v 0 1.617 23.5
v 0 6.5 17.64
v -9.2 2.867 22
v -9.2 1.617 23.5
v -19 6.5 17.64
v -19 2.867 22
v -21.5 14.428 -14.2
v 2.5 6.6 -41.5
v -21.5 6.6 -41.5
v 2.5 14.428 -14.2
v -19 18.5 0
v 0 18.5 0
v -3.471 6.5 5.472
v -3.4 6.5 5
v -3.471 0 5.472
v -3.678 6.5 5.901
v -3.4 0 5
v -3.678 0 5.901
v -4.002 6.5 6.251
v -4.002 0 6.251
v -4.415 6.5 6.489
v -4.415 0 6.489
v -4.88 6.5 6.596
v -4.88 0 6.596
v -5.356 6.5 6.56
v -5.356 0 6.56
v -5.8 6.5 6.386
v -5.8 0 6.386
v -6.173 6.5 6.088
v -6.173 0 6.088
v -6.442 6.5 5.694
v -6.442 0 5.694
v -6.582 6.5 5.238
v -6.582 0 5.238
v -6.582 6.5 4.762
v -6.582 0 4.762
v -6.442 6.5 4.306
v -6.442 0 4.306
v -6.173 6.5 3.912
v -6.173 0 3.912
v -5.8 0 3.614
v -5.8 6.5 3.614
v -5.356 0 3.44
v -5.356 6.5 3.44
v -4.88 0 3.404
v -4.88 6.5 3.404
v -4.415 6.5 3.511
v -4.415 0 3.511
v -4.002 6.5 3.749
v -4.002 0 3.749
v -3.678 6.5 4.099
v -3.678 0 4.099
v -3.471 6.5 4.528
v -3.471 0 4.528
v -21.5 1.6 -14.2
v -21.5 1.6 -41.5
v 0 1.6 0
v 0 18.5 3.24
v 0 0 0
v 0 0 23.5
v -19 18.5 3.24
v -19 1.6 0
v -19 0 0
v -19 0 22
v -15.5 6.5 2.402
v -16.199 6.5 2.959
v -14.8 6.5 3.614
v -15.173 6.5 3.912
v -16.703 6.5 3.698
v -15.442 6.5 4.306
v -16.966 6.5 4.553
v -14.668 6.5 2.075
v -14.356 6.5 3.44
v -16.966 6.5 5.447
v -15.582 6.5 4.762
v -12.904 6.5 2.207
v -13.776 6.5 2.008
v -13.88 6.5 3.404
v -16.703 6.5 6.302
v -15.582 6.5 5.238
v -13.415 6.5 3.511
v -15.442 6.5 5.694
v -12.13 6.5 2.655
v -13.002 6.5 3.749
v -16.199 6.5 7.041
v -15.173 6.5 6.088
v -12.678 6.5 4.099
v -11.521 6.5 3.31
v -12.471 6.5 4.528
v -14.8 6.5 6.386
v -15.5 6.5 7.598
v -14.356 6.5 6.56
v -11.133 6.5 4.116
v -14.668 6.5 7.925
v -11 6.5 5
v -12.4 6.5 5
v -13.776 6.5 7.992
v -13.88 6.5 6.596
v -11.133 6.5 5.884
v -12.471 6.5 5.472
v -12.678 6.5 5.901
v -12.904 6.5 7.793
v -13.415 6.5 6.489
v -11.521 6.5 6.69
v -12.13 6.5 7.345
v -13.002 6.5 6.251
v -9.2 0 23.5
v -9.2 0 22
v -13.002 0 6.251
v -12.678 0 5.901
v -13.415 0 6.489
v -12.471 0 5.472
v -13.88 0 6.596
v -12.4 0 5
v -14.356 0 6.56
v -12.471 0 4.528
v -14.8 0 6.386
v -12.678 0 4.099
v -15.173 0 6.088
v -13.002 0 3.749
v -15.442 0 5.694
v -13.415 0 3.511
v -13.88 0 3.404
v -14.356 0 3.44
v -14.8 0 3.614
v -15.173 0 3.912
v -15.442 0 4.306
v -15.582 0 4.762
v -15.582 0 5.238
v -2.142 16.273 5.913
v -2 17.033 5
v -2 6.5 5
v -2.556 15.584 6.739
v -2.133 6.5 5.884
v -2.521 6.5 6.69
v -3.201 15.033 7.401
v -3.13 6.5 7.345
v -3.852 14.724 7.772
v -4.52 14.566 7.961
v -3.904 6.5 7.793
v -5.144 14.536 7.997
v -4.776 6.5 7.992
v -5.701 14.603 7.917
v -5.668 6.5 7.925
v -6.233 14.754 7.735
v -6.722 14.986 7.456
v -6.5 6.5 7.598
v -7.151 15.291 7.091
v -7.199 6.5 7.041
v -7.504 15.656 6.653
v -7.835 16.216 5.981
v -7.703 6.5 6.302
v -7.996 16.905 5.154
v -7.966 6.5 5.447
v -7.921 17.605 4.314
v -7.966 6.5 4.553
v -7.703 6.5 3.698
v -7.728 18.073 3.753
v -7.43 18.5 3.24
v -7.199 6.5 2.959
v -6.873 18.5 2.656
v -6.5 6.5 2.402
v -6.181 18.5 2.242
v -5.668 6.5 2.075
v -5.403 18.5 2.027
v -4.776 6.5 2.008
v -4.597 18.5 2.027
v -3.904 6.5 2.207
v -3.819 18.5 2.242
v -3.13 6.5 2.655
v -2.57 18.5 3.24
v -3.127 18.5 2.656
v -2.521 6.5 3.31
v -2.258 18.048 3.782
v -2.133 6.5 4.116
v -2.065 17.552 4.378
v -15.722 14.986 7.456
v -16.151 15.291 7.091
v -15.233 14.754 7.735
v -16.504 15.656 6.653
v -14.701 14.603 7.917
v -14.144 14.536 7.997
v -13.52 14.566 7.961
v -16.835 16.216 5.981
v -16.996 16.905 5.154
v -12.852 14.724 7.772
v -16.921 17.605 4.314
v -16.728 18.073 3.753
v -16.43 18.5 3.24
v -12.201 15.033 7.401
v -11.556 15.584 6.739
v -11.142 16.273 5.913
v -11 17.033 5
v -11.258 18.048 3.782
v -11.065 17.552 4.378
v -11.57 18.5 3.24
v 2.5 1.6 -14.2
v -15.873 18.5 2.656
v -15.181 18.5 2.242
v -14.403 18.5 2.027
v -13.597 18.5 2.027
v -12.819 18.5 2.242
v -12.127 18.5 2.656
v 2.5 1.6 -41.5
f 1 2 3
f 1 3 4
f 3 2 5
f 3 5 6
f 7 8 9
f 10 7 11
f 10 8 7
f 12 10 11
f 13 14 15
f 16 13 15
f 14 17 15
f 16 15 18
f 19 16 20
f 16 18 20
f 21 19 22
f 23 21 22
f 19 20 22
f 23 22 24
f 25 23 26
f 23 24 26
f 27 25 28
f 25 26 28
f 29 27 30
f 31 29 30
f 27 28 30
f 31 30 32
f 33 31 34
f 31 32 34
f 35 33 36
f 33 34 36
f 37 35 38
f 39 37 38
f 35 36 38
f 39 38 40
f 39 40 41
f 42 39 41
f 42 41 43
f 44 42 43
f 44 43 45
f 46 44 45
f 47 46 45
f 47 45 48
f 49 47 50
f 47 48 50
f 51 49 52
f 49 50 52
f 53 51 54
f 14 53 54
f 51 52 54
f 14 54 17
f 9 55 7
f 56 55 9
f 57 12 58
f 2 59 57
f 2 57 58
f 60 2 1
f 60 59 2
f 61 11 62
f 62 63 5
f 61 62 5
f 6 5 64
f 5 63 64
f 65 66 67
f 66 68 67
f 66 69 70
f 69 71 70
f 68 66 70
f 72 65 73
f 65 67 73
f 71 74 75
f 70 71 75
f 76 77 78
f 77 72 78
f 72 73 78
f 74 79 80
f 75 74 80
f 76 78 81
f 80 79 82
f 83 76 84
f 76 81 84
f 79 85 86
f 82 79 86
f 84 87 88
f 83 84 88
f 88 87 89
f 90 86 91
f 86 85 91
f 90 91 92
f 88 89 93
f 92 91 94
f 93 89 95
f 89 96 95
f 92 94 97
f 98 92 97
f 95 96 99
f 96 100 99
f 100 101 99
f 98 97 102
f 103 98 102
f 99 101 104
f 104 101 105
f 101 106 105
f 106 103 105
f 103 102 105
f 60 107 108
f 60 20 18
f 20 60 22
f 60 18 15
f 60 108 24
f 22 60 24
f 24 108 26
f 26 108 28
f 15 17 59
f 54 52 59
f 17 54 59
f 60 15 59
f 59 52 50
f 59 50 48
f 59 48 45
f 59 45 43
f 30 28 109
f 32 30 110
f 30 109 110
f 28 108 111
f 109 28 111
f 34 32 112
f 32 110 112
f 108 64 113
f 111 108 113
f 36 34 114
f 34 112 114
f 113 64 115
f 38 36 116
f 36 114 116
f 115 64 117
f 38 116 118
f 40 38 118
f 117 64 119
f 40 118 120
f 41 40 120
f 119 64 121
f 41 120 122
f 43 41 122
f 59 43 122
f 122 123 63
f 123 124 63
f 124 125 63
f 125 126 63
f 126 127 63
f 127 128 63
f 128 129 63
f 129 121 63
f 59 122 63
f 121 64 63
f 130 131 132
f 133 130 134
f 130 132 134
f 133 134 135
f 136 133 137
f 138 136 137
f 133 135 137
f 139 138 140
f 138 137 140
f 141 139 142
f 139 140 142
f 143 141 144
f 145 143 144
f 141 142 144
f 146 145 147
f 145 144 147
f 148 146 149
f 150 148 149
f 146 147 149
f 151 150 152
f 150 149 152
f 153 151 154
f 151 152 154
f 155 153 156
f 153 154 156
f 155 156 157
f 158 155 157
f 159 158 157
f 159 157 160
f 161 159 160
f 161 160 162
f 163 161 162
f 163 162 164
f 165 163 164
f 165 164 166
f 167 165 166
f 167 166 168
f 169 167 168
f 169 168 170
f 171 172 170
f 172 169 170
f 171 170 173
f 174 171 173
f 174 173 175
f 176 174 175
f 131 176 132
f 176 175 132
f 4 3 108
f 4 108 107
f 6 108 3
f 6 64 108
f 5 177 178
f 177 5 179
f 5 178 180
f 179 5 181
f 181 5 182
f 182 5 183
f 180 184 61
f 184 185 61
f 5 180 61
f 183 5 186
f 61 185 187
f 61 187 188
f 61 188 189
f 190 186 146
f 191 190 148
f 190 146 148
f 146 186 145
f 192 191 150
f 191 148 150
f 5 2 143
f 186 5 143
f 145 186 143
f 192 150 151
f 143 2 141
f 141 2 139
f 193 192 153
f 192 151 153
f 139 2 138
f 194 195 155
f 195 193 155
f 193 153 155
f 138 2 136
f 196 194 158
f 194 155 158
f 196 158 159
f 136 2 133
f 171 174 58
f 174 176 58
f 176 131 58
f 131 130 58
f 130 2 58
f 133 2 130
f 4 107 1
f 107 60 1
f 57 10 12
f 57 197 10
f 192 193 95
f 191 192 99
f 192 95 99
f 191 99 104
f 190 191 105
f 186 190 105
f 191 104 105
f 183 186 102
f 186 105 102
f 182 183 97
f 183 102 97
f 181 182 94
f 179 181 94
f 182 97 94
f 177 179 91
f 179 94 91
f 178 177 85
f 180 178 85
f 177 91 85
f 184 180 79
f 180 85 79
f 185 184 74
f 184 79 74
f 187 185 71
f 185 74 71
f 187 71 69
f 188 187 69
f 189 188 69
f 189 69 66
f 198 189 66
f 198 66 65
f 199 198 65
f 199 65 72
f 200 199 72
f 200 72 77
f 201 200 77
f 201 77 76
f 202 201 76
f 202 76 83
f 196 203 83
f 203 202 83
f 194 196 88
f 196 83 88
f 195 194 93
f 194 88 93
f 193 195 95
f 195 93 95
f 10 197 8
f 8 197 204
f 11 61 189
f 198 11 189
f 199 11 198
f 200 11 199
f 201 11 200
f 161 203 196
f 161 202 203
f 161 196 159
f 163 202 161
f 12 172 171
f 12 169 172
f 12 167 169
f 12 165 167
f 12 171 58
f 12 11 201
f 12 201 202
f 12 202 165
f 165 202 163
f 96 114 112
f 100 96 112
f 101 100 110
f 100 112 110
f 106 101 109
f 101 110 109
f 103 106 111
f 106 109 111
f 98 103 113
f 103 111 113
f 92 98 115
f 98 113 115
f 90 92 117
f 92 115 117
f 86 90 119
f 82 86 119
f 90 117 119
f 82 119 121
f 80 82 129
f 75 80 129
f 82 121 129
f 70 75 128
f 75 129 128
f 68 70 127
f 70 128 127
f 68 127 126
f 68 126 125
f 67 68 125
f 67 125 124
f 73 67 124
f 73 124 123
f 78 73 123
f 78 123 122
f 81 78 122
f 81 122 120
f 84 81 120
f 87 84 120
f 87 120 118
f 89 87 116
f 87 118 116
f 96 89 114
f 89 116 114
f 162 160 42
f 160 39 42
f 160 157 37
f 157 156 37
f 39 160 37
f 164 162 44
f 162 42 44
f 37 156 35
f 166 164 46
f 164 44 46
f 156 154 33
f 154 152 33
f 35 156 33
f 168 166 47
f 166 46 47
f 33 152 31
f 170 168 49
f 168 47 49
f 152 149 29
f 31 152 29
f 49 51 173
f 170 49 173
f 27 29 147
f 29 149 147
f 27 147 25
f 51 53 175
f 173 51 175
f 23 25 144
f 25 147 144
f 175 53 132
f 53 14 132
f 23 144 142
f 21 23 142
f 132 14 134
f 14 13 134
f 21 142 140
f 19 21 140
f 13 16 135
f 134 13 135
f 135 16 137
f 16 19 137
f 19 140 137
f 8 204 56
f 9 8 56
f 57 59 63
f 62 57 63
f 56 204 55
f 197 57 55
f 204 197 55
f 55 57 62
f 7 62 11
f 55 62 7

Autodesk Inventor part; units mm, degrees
sketch "Sketch2" plane through (0, 0, 0) normal (0, 1, 0) x (-1, 0, 0)
  line L0 (0, 0) -> (19, 0)
  line L1 (19, 0) -> (19, 22)
  line L2 (19, 22) -> (0, 22)
  line L3 (0, 22) -> (0, 0)
  line L4 (19, 22) -> (14, 22)
  line L5 (14, 22) -> (14, 5)
  line L6 (14, 5) -> (19, 5)
  line L7 (19, 5) -> (19, 22)
  line L8 (0, 22) -> (5, 22)
  line L9 (5, 22) -> (5, 5)
  line L10 (5, 5) -> (0, 5)
  line L11 (0, 5) -> (0, 22)
  circle A0 centre (14, 5) radius 1.7
  circle A1 centre (5, 5) radius 1.7
  dimension "d0" = 19
  dimension "d1" = 22
  dimension "d2" = 5
  dimension "d3" = 17
  dimension "d4" = 5
  dimension "d5" = 17
  dimension "d6" = 3.4
  dimension "d7" = 3.4
extrude "Extrusion1" add sketch "Sketch2" along normal blind 17.2 contours L3 L10 A1 L9 L2 L5 A0 L6 L1 L0 | L3 L2 L9 A1 L10 | L6 A0 L5 L2 L1
sketch "Sketch4" plane through (0, 0, 22) normal (1, 0, 0) x (0, 0, -1)
  line L0 (0, 0) -> (17.2, 0)
  line L1 (17.2, 0) -> (-6, 0)
  line L2 (-6, 0) -> (-6, -60)
  line L3 (-6, -60) -> (17.2, -60)
  line L4 (17.2, -60) -> (17.2, 0)
  line L5 (0, 0) -> (17.2, 0)
  line L6 (17.2, 0) -> (-6, 0)
  line L7 (-6, 0) -> (-6, -60)
  line L8 (-6, -60) -> (17.2, -60)
  line L9 (17.2, -60) -> (17.2, 0)
  line L10 (0, 0) -> (22, 0) projected
  line L11 (22, 0) -> (22, -6)
  line L12 (22, -6) -> (82, -6)
  line L13 (82, -6) -> (82, 17.2)
  line L14 (82, 17.2) -> (22, 17.2)
  line L15 (22, 17.2) -> (22, -6)
  point P0 (0, 22)
  point P1 (0, 22)
  dimension "d15" = 23.2
  dimension "d16" = 60
  dimension "d17" = 23.2
  dimension "d18" = 60
  dimension "d19" = 6
  dimension "d20" = 60
  dimension "d21" = 23.2
extrude "Extrusion2" add sketch "Sketch4" against normal blind 19 contours L15 L14 L13 L12 L11
sketch "Sketch5" plane through (0, -6, -60) normal (0, -1, 0) x (1, 0, 0)
  line L0 (0, 82) -> (0, 0) projected
  line L1 (-19, 82) -> (-19, 0) projected
  line L2 (0, 0) -> (-19, 0)
  line L3 (-19, 0) -> (-19, 38.5)
  line L4 (-19, 38.5) -> (0, 38.5)
  line L5 (0, 38.5) -> (0, 0)
  point P0 (0, 60)
  dimension "d24" = 38.5
extrude "Extrusion3" cut sketch "Sketch5" against normal blind 18.2
sketch "Sketch6" plane through (0, 17.2, 0) normal (0, 1, 0) x (1, 0, 0)
  line L0 (0, -22) -> (0, 0) projected
  line L1 (-19, 21.5) -> (-19, 0) projected
  line L2 (0, -22) -> (-19, -22)
  line L3 (-19, -22) -> (-19, 0)
  line L4 (-19, 0) -> (0, 0)
  line L5 (0, 0) -> (0, -22)
  dimension "d27" = 22
extrude "Extrusion4" cut sketch "Sketch6" against normal blind 10
sketch "Sketch7" plane through (0, 17.2, 0) normal (0, 1, 0) x (1, 0, 0)
  line L0 (0, -22) -> (0, 0) projected
  line L1 (0, 0) -> (-19, 0) projected
  line L2 (0, 0) -> (-19, 0)
  line L3 (-9.5, 0) -> (6.4, 0)
  line L4 (6.4, 0) -> (6.4, 21.5)
  line L5 (0, 0) -> (0, 21.5) projected
  line L6 (6.4, 21.5) -> (0, 21.5)
  line L7 (0, 21.5) -> (0, 0)
  line L8 (0, 0) -> (6.4, 0)
  line L9 (6.4, 0) -> (6.4, 21.5)
  line L10 (-19, 21.5) -> (-19, 0) projected
  line L11 (-9.5, 0) -> (-19, 0)
  line L12 (-19, 0) -> (-19, 21.5)
  line L13 (-19, 21.5) -> (-9.5, 21.5)
  line L14 (-9.5, 21.5) -> (-9.5, 0)
  line L15 (-9.5, 0) -> (-25.4, 0)
  line L16 (-25.4, 0) -> (-25.4, 21.5)
  line L17 (-25.4, 21.5) -> (-9.5, 21.5)
  line L18 (-9.5, 21.5) -> (-9.5, 0)
  line L19 (6.4, 21.5) -> (0, 0)
  line L20 (-25.4, 21.5) -> (-19, 0)
  dimension "d30" = 15.9
  dimension "d31" = 21.5
  dimension "d32" = 15.9
extrude "Extrusion5" add sketch "Sketch7" against normal blind 23.2 contours L5 L6 L19 | L20 L17 L10
sketch "Sketch8" plane through (0, 17.2, 0) normal (0, 1, 0) x (1, 0, 0)
  line L0 (6.4, 21.5) -> (0, 0) projected
  line L1 (0, 21.5) -> (0, 60) projected
  line L2 (6.4, 21.5) -> (0, 21.5)
  line L3 (0, 21.5) -> (0, 60)
  line L4 (0, 60) -> (6.4, 60)
  line L5 (6.4, 60) -> (6.4, 21.5)
  line L6 (-19, 60) -> (-19, 21.5) projected
  line L7 (-19, 0) -> (-25.4, 21.5) projected
  line L8 (-19, 60) -> (-25.4, 60)
  line L9 (-25.4, 60) -> (-25.4, 21.5)
  line L10 (-25.4, 21.5) -> (-19, 21.5)
  line L11 (-19, 21.5) -> (-19, 60)
extrude "Extrusion6" add sketch "Sketch8" against normal blind 5
chamfer "Chamfer1" [suppressed]
ref_plane "Work Plane1" through (-25.4, 8, -21.5) normal (0, -1, 0) x (1, 0, 0)
chamfer "Chamfer4" distance 12 angle 25 1 edges at (-9.5, 7.2, 22) measured on face at (-10.7991, 7.2, 16.8632)
sketch "Sketch10" plane through (0, 12.2, -60) normal (0, -1, 0) x (1, 0, 0)
  line L0 (-25.4, 38.5) -> (6.4, 38.5)
  line L1 (-25.4, 38.5) -> (6.4, 38.5)
  line L2 (-9.5, 38.5) -> (-9.5, 26)
  line L3 (-9.5, 26) -> (-9.5, 6)
  line L4 (-9.5, 16) -> (-19.5, 16)
  line L5 (-19.5, 16) -> (0.5, 16)
  circle A0 centre (-19.5, 16) radius 1.7
  circle A1 centre (-9.5, 6) radius 1.7
  circle A2 centre (-9.5, 26) radius 1.7
  circle A3 centre (0.5, 16) radius 1.7
  point P0 (0, 60)
  point P1 (0, 60)
  dimension "d70" = 12.5
  dimension "d71" = 20
  dimension "d72" = 10
  dimension "d73" = 20
  dimension "d74" = 3.4
  dimension "d75" = 3.4
  dimension "d76" = 3.4
  dimension "d77" = 3.4
extrude "Extrusion9" cut sketch "Sketch10" against normal blind 10
sketch "Sketch11" plane through (0, 17.2, 0) normal (0, 1, 0) x (1, 0, 0)
  circle A0 centre (0.5, 44) radius 1.7 projected
  circle A1 centre (0.5, 44) radius 3.25
  circle A2 centre (-9.5, 54) radius 1.7 projected
  circle A3 centre (-9.5, 54) radius 3.25
  circle A4 centre (-19.5, 44) radius 1.7 projected
  circle A5 centre (-19.5, 44) radius 3.25
  circle A6 centre (-9.5, 34) radius 1.7 projected
  circle A7 centre (-9.5, 34) radius 3.25
  point P0 (0, 60)
  dimension "d84" = 6.5
  dimension "d85" = 6.5
  dimension "d86" = 6.5
  dimension "d87" = 6.5
extrude "Extrusion10" cut sketch "Sketch11" against normal blind 3 contours A1 | A2 | A3 | A4 | A5 | A6 | A7
ref_plane "Work Plane2" through (-9.5, 17.2, -60) normal (-1, 0, 0) x (0, 0, 1)
chamfer "Chamfer6" [suppressed]
sketch "l" plane through (-19, 0, 0) normal (-1, 0, 0) x (0, 0, 1)
  line L0 (22, 1.6043) -> (10, 7.2) projected
  line L1 (10, 7.2) -> (32.2401, -3.1707)
  line L2 (0, 0) -> (22, 0) projected
  line L3 (0, 0) -> (30.1828, 0)
  line L4 (22, 0) -> (23.5, 0)
  line L5 (23.5, 0) -> (23.5, 4.1635)
  line L6 (22, 0) -> (22, 1.6043) projected
  line L7 (22, 1.6043) -> (22, 0)
  point P0 (23.5, 0.9048)
  dimension "d104" = 1.5
extrude "Extrusion12" add sketch "l" against normal blind 9.2 contours L1 L5 L3 L6
sketch "Sketch14" plane through (-19, 0, 0) normal (-1, 0, 0) x (0, 0, 1)
  line L0 (0, 17.2) -> (25.44, 17.2)
  line L1 (25.44, 17.2) -> (25.44, 0)
  line L2 (25.44, 0) -> (0, 0)
  line L3 (0, 0) -> (0, 17.2)
  line L4 (0, 17.2) -> (25.44, 0)
  dimension "d107" = 25.44
extrude "Extrusion13" add sketch "Sketch14" against normal blind 19 contours L4 L2 L3
sketch "Sketch15" plane through (0, 0, 0) normal (0, -1, 0) x (1, 0, 0)
  line L0 (6.4, -21.5) -> (0, 0) projected
  line L1 (0, 0) -> (0, 5)
  line L2 (0, 25.44) -> (0, 0) projected
  line L3 (0, 5) -> (0, 10)
  line L4 (0, 5) -> (-5, 5)
  line L5 (0, 0) -> (-19, 0) projected
  line L6 (-19, 0) -> (-19, 5)
  line L7 (-19, 0) -> (-19, 25.44) projected
  line L8 (-19, 5) -> (-14, 5)
  circle A0 centre (-14, 5) radius 1.6
  circle A1 centre (-5, 5) radius 1.6
  point P0 (0.5177, -1.7393)
  point P1 (0.9, -3.0234)
  dimension "d110" = 5
  dimension "d111" = 5
  dimension "d112" = 5
  dimension "d113" = 5
  dimension "d114" = 5
  dimension "d115" = 3.2
  dimension "d116" = 3.2
extrude "Extrusion14" cut sketch "Sketch15" against normal blind 19
ref_plane "Work Plane3" through (0, 6.5, 0) normal (0, -1, 0) x (1, 0, 0)
sketch "Sketch16" plane through (0, 6.5, 0) normal (0, -1, 0) x (1, 0, 0)
  circle A0 centre (-14, 5) radius 1.6 projected
  circle A1 centre (-14, 5) radius 3
  circle A2 centre (-5, 5) radius 1.6 projected
  circle A3 centre (-5, 5) radius 3
  point P0 (0, 0)
  dimension "d120" = 6
  dimension "d121" = 6
extrude "Extrusion15" cut sketch "Sketch16" against normal blind 19
sketch "Sketch17" plane through (0, 17.2, 0) normal (0, 1, 0) x (1, 0, 0)
  line L0 (6.4, 60) -> (-25.4, 60) projected
  line L1 (0, 0) -> (6.4, 21.5) projected
  line L2 (6.4, 60) -> (6.4, 21.5)
  line L3 (0, 0) -> (-19, 0) projected
  line L4 (6.4, 21.5) -> (0, 0)
  line L5 (0, 0) -> (-19, 0)
  line L6 (-19, 0) -> (-25.4, 21.5)
  line L7 (-25.4, 21.5) -> (-25.4, 60)
  line L8 (-25.4, 60) -> (6.4, 60)
  circle A0 centre (-9.5, 54) radius 3.25 projected
  circle A1 centre (-9.5, 54) radius 3.25
  circle A2 centre (0.5, 44) radius 1.7 projected
  circle A3 centre (0.5, 44) radius 3.25
  circle A4 centre (-9.5, 34) radius 1.7 projected
  circle A5 centre (-9.5, 34) radius 3.25
  circle A6 centre (-19.5, 44) radius 1.7 projected
  circle A7 centre (-19.5, 44) radius 3.25
extrude "Extrusion16" add sketch "Sketch17" along normal blind 4 contours L2 L1 L3 L6 L7 L0
sketch "Sketch18" plane through (-19, 0, 0) normal (-1, 0, 0) x (0, 0, 1)
  line L0 (0, 21.2) -> (25.44, 0)
  line L1 (25.44, 0) -> (0, 17.2)
  line L2 (0, 17.2) -> (0, 21.2) projected
  line L3 (0, 17.2) -> (0, 21.2)
  point P0 (0, 0)
extrude "Extrusion17" add sketch "Sketch18" against normal blind 19
extrude "Extrusion18" cut sketch "Sketch16" against normal blind 19 contours A0 | A1 | A2 | A3
sketch "Sketch20" plane through (0, 0, 25.44) normal (1, 0, 0) x (0, 0, -1)
  line L0 (25.44, 0) -> (0, 0) projected
  line L1 (0, 0) -> (1.94, 0)
  line L2 (1.94, 0) -> (1.94, 2.92)
  line L3 (1.94, 2.92) -> (0, 2.92)
  line L4 (0, 2.92) -> (0, 0)
  point P0 (1.94, 0)
  dimension "d148" = 1.94
extrude "Extrusion19" cut sketch "Sketch20" against normal blind 9.2
sketch "Sketch21" plane through (-19, 0, 0) normal (-1, 0, 0) x (0, 0, 1)
  line L0 (25.44, 0) -> (0, 21.2) projected
  line L1 (25.44, 0) -> (22, 0)
  line L2 (22, 0) -> (22, 4.8404)
  line L3 (22, 4.8404) -> (25.44, 4.8404)
  line L4 (25.44, 4.8404) -> (25.44, 0)
  point P0 (0, 0)
  point P1 (16.0198, 7.8502)
  dimension "d151" = 3.44
extrude "Extrusion20" cut sketch "Sketch21" against normal blind 9.8
sketch "Sketch22" plane through (-25.4, -6, -21.5) normal (0, -1, 0) x (1, 0, 0)
  line L0 (0, 0) -> (6.4, 21.5)
  line L1 (25.4, 21.5) -> (6.4, 21.5) projected
  line L2 (6.4, 21.5) -> (25.4, 21.5)
  line L3 (25.4, 21.5) -> (31.8, 0)
  line L4 (6.4, 21.5) -> (0, 0) projected
  line L5 (31.8, 0) -> (0, 0)
extrude "Extrusion21" cut sketch "Sketch22" against normal blind 7.6
sketch "Sketch23" plane through (-25.4, 1.6, -21.5) normal (0, -1, 0) x (1, 0, 0)
  line L0 (0, 0) -> (6.4, 21.5) projected
  line L1 (6.4, 21.5) -> (-4.398, 21.5)
  line L2 (-4.398, 21.5) -> (-4.398, -43.3957)
  line L3 (-4.398, -43.3957) -> (6.4, -43.3957)
  line L4 (6.4, -43.3957) -> (6.4, 21.5)
  line L5 (25.4, 21.5) -> (31.8, 0) projected
  line L6 (25.4, 21.5) -> (33.9316, 21.5)
  line L7 (33.9316, 21.5) -> (33.9316, -42.1701)
  line L8 (33.9316, -42.1701) -> (25.4, -42.1701)
  line L9 (25.4, -42.1701) -> (25.4, 21.5)
  line L10 (0, 0) -> (31.8, 0) projected
  line L11 (31.8, -38.5) -> (0, -38.5) projected
  line L12 (0, 0) -> (31.8, 0)
  line L13 (31.8, 0) -> (31.8, -38.5)
  line L14 (31.8, -38.5) -> (0, -38.5)
  line L15 (0, -38.5) -> (0, 0)
  point P0 (0, -38.5)
  point P1 (25.4, 0)
  point P2 (6.4, 0)
extrude "Extrusion22" cut sketch "Sketch23" against normal blind 40 contours L0 L4 L10 | L10 L4 L11 L15 | L10 L9 L11 L4 | L10 L13 L11 L9 | L9 L5 L10
sketch "Sketch25" plane through (0, 21.2, 0) normal (0, 1, 0) x (1, 0, 0)
  line L0 (8.5307, 32.4307) -> (-26.8903, 32.4307)
  line L1 (-26.8903, 32.4307) -> (-26.8903, -40.3587)
  line L2 (-26.8903, -40.3587) -> (8.5307, -40.3587)
  line L3 (8.5307, -40.3587) -> (8.5307, 32.4307)
  point P0 (0, 0)
extrude "Extrusion23" cut sketch "Sketch25" against normal blind 14.7
sketch "Sketch26" plane through (0, 6.5, -21.5) normal (0, 0, -1) x (-1, 0, 0)
  line L0 (0, -4.9) -> (19, -4.9) projected
  line L1 (19, -3.6333) -> (19, 0) projected
  line L2 (0, -4.9) -> (19, -4.9)
  line L3 (19, -4.9) -> (19, 0)
  line L4 (19, 0) -> (0, 0)
  line L5 (0, 0) -> (0, -4.9)
  point P0 (0, -6.5)
extrude "Extrusion24" add sketch "Sketch26" along normal blind 20
sketch "Sketch27" plane through (-25.4, 1.6, -21.5) normal (0, -1, 0) x (1, 0, 0)
  line L0 (6.4, 39.14) -> (6.4, -20) projected
  line L1 (6.4, -20) -> (3.9, -20)
  line L2 (3.9, -20) -> (3.9, 21.5)
  line L3 (3.9, 21.5) -> (6.4, 21.5)
  line L4 (6.4, 21.5) -> (6.4, -20)
  line L5 (25.4, 45) -> (25.4, 21.5) projected
  line L6 (25.4, 21.5) -> (27.9, 21.5)
  line L7 (27.9, 21.5) -> (27.9, -20)
  line L8 (27.9, -20) -> (25.4, -20)
  line L9 (25.4, -20) -> (25.4, 21.5)
  point P0 (6.4, 21.5)
  dimension "d165" = 2.5
  dimension "d166" = 2.5
extrude "Extrusion25" add sketch "Sketch27" against normal blind 4.9
sketch "Sketch28" plane through (-25.4, 1.6, -21.5) normal (0, -1, 0) x (1, 0, 0)
  line L0 (6.4, 39.14) -> (6.4, 21.5) projected
  line L1 (6.4, 21.5) -> (6.4, 7.3)
  line L2 (6.4, 7.3) -> (2.4289, 7.3)
  line L3 (3.9, -20) -> (3.9, 21.5) projected
  line L4 (6.4, 21.5) -> (25.4, 21.5) projected
  line L5 (3.9, 7.3) -> (6.4, 21.5)
  line L6 (3.9, 21.5) -> (6.4, 21.5)
  line L7 (6.4, 21.5) -> (6.4, 7.3)
  line L8 (6.4, 7.3) -> (3.9, 7.3)
  line L9 (3.9, 7.3) -> (3.9, 21.5)
  line L10 (15.9, 21.5) -> (15.9, 25.242)
  line L11 (15.9, 25.242) -> (15.9, 16.8089)
  line L12 (25.4, 39.14) -> (25.4, 21.5)
  line L13 (25.4, 21.5) -> (25.4, 7.3)
  line L14 (25.4, 7.3) -> (29.3711, 7.3)
  line L15 (27.9, -20) -> (27.9, 21.5)
  line L16 (25.4, 21.5) -> (6.4, 21.5)
  line L17 (27.9, 7.3) -> (25.4, 21.5)
  line L18 (27.9, 21.5) -> (25.4, 21.5)
  line L19 (25.4, 21.5) -> (25.4, 7.3)
  line L20 (25.4, 7.3) -> (27.9, 7.3)
  line L21 (27.9, 7.3) -> (27.9, 21.5)
  point P0 (6.4, 21.5)
  dimension "d169" = 14.2
extrude "Extrusion26" cut sketch "Sketch28" against normal blind 10 contours L18 L15 L17 | L5 L3 L6
sketch "Sketch29" plane through (0, 6.5, 0) normal (0, 1, 0) x (1, 0, 0)
  line L0 (-19, -22) -> (-19, -17.64) projected
  line L1 (-19, 0) -> (-19, -22) projected
  line L2 (-19, -17.64) -> (-19, 0)
  line L3 (-21.5, 14.2) -> (-21.5, 41.5) projected
  line L4 (-19, 0) -> (-21.5, 14.2)
  line L5 (-21.5, 14.2) -> (-21.5, 41.5)
  line L6 (2.5, 41.5) -> (-21.5, 41.5) projected
  line L7 (-21.5, 41.5) -> (2.5, 41.5)
  line L8 (2.5, 14.2) -> (2.5, 41.5) projected
  line L9 (2.5, 41.5) -> (2.5, 14.2)
  line L10 (2.5, 14.2) -> (0, 0)
  line L11 (0, -17.64) -> (-19, -17.64) projected
  line L12 (0, 0) -> (0, -17.64)
  line L13 (0, -17.64) -> (-19, -17.64)
  circle A0 centre (-14, -5) radius 1.6 projected
  circle A1 centre (-14, -5) radius 3
  circle A2 centre (-5, -5) radius 1.6 projected
  circle A3 centre (-5, -5) radius 3
  dimension "d172" = 6
  dimension "d173" = 6
extrude "Extrusion27" add sketch "Sketch29" along normal blind 12 contours L4 L3 L6 L8 L10 L12 L11 L1
sketch "Sketch30" plane through (-19, 0, 22) normal (-1, 0, 0) x (0, 0, 1)
  line L0 (-4.36, 6.5) -> (1.5, 1.6167) projected
  line L1 (1.5, 1.6167) -> (-4.36, 6.5)
  line L2 (-4.36, 6.5) -> (-25.2198, 23.8832)
  line L3 (-25.2198, 23.8832) -> (-1.43, 23.8832)
  line L4 (-14, 18.5) -> (-14, 6.5) projected
  line L5 (-1.43, 23.8832) -> (-4.36, 6.5)
  point P0 (-22, 0)
  dimension "d176" = 180
extrude "Extrusion28" cut sketch "Sketch30" along normal mid plane 50
sketch "Sketch31" plane through (-19, 0, 22) normal (-1, 0, 0) x (0, 0, 1)
  line L0 (-22, 1.6) -> (-22, 18.5) projected
  line L1 (-36.2, 1.6) -> (-63.5, 1.6) projected
  line L2 (-22, 1.6) -> (-63.5, 1.6)
  line L3 (-63.5, 1.6) -> (-63.5, 6.6)
  line L4 (-63.5, 1.6) -> (-63.5, 18.5) projected
  line L5 (-22, 18.5) -> (-22, 1.6) projected
  line L6 (-63.5, 6.6) -> (-22, 18.5)
  line L7 (-22, 18.5) -> (-22, 1.6)
  line L8 (-63.5, 6.6) -> (-22, 18.5)
  line L9 (-22, 18.5) -> (-18.76, 18.5) projected
  line L10 (-63.5, 18.5) -> (-22, 18.5)
  line L11 (-63.5, 18.5) -> (-36.2, 18.5) projected
  line L12 (-22, 18.5) -> (-63.5, 18.5)
  line L13 (-63.5, 18.5) -> (-63.5, 6.6)
  point P0 (-22, 0)
  dimension "d179" = 5
extrude "Extrusion29" cut sketch "Sketch31" along normal mid plane 50 contours L6 L4 L10
properties part number "Finger_right_3"
